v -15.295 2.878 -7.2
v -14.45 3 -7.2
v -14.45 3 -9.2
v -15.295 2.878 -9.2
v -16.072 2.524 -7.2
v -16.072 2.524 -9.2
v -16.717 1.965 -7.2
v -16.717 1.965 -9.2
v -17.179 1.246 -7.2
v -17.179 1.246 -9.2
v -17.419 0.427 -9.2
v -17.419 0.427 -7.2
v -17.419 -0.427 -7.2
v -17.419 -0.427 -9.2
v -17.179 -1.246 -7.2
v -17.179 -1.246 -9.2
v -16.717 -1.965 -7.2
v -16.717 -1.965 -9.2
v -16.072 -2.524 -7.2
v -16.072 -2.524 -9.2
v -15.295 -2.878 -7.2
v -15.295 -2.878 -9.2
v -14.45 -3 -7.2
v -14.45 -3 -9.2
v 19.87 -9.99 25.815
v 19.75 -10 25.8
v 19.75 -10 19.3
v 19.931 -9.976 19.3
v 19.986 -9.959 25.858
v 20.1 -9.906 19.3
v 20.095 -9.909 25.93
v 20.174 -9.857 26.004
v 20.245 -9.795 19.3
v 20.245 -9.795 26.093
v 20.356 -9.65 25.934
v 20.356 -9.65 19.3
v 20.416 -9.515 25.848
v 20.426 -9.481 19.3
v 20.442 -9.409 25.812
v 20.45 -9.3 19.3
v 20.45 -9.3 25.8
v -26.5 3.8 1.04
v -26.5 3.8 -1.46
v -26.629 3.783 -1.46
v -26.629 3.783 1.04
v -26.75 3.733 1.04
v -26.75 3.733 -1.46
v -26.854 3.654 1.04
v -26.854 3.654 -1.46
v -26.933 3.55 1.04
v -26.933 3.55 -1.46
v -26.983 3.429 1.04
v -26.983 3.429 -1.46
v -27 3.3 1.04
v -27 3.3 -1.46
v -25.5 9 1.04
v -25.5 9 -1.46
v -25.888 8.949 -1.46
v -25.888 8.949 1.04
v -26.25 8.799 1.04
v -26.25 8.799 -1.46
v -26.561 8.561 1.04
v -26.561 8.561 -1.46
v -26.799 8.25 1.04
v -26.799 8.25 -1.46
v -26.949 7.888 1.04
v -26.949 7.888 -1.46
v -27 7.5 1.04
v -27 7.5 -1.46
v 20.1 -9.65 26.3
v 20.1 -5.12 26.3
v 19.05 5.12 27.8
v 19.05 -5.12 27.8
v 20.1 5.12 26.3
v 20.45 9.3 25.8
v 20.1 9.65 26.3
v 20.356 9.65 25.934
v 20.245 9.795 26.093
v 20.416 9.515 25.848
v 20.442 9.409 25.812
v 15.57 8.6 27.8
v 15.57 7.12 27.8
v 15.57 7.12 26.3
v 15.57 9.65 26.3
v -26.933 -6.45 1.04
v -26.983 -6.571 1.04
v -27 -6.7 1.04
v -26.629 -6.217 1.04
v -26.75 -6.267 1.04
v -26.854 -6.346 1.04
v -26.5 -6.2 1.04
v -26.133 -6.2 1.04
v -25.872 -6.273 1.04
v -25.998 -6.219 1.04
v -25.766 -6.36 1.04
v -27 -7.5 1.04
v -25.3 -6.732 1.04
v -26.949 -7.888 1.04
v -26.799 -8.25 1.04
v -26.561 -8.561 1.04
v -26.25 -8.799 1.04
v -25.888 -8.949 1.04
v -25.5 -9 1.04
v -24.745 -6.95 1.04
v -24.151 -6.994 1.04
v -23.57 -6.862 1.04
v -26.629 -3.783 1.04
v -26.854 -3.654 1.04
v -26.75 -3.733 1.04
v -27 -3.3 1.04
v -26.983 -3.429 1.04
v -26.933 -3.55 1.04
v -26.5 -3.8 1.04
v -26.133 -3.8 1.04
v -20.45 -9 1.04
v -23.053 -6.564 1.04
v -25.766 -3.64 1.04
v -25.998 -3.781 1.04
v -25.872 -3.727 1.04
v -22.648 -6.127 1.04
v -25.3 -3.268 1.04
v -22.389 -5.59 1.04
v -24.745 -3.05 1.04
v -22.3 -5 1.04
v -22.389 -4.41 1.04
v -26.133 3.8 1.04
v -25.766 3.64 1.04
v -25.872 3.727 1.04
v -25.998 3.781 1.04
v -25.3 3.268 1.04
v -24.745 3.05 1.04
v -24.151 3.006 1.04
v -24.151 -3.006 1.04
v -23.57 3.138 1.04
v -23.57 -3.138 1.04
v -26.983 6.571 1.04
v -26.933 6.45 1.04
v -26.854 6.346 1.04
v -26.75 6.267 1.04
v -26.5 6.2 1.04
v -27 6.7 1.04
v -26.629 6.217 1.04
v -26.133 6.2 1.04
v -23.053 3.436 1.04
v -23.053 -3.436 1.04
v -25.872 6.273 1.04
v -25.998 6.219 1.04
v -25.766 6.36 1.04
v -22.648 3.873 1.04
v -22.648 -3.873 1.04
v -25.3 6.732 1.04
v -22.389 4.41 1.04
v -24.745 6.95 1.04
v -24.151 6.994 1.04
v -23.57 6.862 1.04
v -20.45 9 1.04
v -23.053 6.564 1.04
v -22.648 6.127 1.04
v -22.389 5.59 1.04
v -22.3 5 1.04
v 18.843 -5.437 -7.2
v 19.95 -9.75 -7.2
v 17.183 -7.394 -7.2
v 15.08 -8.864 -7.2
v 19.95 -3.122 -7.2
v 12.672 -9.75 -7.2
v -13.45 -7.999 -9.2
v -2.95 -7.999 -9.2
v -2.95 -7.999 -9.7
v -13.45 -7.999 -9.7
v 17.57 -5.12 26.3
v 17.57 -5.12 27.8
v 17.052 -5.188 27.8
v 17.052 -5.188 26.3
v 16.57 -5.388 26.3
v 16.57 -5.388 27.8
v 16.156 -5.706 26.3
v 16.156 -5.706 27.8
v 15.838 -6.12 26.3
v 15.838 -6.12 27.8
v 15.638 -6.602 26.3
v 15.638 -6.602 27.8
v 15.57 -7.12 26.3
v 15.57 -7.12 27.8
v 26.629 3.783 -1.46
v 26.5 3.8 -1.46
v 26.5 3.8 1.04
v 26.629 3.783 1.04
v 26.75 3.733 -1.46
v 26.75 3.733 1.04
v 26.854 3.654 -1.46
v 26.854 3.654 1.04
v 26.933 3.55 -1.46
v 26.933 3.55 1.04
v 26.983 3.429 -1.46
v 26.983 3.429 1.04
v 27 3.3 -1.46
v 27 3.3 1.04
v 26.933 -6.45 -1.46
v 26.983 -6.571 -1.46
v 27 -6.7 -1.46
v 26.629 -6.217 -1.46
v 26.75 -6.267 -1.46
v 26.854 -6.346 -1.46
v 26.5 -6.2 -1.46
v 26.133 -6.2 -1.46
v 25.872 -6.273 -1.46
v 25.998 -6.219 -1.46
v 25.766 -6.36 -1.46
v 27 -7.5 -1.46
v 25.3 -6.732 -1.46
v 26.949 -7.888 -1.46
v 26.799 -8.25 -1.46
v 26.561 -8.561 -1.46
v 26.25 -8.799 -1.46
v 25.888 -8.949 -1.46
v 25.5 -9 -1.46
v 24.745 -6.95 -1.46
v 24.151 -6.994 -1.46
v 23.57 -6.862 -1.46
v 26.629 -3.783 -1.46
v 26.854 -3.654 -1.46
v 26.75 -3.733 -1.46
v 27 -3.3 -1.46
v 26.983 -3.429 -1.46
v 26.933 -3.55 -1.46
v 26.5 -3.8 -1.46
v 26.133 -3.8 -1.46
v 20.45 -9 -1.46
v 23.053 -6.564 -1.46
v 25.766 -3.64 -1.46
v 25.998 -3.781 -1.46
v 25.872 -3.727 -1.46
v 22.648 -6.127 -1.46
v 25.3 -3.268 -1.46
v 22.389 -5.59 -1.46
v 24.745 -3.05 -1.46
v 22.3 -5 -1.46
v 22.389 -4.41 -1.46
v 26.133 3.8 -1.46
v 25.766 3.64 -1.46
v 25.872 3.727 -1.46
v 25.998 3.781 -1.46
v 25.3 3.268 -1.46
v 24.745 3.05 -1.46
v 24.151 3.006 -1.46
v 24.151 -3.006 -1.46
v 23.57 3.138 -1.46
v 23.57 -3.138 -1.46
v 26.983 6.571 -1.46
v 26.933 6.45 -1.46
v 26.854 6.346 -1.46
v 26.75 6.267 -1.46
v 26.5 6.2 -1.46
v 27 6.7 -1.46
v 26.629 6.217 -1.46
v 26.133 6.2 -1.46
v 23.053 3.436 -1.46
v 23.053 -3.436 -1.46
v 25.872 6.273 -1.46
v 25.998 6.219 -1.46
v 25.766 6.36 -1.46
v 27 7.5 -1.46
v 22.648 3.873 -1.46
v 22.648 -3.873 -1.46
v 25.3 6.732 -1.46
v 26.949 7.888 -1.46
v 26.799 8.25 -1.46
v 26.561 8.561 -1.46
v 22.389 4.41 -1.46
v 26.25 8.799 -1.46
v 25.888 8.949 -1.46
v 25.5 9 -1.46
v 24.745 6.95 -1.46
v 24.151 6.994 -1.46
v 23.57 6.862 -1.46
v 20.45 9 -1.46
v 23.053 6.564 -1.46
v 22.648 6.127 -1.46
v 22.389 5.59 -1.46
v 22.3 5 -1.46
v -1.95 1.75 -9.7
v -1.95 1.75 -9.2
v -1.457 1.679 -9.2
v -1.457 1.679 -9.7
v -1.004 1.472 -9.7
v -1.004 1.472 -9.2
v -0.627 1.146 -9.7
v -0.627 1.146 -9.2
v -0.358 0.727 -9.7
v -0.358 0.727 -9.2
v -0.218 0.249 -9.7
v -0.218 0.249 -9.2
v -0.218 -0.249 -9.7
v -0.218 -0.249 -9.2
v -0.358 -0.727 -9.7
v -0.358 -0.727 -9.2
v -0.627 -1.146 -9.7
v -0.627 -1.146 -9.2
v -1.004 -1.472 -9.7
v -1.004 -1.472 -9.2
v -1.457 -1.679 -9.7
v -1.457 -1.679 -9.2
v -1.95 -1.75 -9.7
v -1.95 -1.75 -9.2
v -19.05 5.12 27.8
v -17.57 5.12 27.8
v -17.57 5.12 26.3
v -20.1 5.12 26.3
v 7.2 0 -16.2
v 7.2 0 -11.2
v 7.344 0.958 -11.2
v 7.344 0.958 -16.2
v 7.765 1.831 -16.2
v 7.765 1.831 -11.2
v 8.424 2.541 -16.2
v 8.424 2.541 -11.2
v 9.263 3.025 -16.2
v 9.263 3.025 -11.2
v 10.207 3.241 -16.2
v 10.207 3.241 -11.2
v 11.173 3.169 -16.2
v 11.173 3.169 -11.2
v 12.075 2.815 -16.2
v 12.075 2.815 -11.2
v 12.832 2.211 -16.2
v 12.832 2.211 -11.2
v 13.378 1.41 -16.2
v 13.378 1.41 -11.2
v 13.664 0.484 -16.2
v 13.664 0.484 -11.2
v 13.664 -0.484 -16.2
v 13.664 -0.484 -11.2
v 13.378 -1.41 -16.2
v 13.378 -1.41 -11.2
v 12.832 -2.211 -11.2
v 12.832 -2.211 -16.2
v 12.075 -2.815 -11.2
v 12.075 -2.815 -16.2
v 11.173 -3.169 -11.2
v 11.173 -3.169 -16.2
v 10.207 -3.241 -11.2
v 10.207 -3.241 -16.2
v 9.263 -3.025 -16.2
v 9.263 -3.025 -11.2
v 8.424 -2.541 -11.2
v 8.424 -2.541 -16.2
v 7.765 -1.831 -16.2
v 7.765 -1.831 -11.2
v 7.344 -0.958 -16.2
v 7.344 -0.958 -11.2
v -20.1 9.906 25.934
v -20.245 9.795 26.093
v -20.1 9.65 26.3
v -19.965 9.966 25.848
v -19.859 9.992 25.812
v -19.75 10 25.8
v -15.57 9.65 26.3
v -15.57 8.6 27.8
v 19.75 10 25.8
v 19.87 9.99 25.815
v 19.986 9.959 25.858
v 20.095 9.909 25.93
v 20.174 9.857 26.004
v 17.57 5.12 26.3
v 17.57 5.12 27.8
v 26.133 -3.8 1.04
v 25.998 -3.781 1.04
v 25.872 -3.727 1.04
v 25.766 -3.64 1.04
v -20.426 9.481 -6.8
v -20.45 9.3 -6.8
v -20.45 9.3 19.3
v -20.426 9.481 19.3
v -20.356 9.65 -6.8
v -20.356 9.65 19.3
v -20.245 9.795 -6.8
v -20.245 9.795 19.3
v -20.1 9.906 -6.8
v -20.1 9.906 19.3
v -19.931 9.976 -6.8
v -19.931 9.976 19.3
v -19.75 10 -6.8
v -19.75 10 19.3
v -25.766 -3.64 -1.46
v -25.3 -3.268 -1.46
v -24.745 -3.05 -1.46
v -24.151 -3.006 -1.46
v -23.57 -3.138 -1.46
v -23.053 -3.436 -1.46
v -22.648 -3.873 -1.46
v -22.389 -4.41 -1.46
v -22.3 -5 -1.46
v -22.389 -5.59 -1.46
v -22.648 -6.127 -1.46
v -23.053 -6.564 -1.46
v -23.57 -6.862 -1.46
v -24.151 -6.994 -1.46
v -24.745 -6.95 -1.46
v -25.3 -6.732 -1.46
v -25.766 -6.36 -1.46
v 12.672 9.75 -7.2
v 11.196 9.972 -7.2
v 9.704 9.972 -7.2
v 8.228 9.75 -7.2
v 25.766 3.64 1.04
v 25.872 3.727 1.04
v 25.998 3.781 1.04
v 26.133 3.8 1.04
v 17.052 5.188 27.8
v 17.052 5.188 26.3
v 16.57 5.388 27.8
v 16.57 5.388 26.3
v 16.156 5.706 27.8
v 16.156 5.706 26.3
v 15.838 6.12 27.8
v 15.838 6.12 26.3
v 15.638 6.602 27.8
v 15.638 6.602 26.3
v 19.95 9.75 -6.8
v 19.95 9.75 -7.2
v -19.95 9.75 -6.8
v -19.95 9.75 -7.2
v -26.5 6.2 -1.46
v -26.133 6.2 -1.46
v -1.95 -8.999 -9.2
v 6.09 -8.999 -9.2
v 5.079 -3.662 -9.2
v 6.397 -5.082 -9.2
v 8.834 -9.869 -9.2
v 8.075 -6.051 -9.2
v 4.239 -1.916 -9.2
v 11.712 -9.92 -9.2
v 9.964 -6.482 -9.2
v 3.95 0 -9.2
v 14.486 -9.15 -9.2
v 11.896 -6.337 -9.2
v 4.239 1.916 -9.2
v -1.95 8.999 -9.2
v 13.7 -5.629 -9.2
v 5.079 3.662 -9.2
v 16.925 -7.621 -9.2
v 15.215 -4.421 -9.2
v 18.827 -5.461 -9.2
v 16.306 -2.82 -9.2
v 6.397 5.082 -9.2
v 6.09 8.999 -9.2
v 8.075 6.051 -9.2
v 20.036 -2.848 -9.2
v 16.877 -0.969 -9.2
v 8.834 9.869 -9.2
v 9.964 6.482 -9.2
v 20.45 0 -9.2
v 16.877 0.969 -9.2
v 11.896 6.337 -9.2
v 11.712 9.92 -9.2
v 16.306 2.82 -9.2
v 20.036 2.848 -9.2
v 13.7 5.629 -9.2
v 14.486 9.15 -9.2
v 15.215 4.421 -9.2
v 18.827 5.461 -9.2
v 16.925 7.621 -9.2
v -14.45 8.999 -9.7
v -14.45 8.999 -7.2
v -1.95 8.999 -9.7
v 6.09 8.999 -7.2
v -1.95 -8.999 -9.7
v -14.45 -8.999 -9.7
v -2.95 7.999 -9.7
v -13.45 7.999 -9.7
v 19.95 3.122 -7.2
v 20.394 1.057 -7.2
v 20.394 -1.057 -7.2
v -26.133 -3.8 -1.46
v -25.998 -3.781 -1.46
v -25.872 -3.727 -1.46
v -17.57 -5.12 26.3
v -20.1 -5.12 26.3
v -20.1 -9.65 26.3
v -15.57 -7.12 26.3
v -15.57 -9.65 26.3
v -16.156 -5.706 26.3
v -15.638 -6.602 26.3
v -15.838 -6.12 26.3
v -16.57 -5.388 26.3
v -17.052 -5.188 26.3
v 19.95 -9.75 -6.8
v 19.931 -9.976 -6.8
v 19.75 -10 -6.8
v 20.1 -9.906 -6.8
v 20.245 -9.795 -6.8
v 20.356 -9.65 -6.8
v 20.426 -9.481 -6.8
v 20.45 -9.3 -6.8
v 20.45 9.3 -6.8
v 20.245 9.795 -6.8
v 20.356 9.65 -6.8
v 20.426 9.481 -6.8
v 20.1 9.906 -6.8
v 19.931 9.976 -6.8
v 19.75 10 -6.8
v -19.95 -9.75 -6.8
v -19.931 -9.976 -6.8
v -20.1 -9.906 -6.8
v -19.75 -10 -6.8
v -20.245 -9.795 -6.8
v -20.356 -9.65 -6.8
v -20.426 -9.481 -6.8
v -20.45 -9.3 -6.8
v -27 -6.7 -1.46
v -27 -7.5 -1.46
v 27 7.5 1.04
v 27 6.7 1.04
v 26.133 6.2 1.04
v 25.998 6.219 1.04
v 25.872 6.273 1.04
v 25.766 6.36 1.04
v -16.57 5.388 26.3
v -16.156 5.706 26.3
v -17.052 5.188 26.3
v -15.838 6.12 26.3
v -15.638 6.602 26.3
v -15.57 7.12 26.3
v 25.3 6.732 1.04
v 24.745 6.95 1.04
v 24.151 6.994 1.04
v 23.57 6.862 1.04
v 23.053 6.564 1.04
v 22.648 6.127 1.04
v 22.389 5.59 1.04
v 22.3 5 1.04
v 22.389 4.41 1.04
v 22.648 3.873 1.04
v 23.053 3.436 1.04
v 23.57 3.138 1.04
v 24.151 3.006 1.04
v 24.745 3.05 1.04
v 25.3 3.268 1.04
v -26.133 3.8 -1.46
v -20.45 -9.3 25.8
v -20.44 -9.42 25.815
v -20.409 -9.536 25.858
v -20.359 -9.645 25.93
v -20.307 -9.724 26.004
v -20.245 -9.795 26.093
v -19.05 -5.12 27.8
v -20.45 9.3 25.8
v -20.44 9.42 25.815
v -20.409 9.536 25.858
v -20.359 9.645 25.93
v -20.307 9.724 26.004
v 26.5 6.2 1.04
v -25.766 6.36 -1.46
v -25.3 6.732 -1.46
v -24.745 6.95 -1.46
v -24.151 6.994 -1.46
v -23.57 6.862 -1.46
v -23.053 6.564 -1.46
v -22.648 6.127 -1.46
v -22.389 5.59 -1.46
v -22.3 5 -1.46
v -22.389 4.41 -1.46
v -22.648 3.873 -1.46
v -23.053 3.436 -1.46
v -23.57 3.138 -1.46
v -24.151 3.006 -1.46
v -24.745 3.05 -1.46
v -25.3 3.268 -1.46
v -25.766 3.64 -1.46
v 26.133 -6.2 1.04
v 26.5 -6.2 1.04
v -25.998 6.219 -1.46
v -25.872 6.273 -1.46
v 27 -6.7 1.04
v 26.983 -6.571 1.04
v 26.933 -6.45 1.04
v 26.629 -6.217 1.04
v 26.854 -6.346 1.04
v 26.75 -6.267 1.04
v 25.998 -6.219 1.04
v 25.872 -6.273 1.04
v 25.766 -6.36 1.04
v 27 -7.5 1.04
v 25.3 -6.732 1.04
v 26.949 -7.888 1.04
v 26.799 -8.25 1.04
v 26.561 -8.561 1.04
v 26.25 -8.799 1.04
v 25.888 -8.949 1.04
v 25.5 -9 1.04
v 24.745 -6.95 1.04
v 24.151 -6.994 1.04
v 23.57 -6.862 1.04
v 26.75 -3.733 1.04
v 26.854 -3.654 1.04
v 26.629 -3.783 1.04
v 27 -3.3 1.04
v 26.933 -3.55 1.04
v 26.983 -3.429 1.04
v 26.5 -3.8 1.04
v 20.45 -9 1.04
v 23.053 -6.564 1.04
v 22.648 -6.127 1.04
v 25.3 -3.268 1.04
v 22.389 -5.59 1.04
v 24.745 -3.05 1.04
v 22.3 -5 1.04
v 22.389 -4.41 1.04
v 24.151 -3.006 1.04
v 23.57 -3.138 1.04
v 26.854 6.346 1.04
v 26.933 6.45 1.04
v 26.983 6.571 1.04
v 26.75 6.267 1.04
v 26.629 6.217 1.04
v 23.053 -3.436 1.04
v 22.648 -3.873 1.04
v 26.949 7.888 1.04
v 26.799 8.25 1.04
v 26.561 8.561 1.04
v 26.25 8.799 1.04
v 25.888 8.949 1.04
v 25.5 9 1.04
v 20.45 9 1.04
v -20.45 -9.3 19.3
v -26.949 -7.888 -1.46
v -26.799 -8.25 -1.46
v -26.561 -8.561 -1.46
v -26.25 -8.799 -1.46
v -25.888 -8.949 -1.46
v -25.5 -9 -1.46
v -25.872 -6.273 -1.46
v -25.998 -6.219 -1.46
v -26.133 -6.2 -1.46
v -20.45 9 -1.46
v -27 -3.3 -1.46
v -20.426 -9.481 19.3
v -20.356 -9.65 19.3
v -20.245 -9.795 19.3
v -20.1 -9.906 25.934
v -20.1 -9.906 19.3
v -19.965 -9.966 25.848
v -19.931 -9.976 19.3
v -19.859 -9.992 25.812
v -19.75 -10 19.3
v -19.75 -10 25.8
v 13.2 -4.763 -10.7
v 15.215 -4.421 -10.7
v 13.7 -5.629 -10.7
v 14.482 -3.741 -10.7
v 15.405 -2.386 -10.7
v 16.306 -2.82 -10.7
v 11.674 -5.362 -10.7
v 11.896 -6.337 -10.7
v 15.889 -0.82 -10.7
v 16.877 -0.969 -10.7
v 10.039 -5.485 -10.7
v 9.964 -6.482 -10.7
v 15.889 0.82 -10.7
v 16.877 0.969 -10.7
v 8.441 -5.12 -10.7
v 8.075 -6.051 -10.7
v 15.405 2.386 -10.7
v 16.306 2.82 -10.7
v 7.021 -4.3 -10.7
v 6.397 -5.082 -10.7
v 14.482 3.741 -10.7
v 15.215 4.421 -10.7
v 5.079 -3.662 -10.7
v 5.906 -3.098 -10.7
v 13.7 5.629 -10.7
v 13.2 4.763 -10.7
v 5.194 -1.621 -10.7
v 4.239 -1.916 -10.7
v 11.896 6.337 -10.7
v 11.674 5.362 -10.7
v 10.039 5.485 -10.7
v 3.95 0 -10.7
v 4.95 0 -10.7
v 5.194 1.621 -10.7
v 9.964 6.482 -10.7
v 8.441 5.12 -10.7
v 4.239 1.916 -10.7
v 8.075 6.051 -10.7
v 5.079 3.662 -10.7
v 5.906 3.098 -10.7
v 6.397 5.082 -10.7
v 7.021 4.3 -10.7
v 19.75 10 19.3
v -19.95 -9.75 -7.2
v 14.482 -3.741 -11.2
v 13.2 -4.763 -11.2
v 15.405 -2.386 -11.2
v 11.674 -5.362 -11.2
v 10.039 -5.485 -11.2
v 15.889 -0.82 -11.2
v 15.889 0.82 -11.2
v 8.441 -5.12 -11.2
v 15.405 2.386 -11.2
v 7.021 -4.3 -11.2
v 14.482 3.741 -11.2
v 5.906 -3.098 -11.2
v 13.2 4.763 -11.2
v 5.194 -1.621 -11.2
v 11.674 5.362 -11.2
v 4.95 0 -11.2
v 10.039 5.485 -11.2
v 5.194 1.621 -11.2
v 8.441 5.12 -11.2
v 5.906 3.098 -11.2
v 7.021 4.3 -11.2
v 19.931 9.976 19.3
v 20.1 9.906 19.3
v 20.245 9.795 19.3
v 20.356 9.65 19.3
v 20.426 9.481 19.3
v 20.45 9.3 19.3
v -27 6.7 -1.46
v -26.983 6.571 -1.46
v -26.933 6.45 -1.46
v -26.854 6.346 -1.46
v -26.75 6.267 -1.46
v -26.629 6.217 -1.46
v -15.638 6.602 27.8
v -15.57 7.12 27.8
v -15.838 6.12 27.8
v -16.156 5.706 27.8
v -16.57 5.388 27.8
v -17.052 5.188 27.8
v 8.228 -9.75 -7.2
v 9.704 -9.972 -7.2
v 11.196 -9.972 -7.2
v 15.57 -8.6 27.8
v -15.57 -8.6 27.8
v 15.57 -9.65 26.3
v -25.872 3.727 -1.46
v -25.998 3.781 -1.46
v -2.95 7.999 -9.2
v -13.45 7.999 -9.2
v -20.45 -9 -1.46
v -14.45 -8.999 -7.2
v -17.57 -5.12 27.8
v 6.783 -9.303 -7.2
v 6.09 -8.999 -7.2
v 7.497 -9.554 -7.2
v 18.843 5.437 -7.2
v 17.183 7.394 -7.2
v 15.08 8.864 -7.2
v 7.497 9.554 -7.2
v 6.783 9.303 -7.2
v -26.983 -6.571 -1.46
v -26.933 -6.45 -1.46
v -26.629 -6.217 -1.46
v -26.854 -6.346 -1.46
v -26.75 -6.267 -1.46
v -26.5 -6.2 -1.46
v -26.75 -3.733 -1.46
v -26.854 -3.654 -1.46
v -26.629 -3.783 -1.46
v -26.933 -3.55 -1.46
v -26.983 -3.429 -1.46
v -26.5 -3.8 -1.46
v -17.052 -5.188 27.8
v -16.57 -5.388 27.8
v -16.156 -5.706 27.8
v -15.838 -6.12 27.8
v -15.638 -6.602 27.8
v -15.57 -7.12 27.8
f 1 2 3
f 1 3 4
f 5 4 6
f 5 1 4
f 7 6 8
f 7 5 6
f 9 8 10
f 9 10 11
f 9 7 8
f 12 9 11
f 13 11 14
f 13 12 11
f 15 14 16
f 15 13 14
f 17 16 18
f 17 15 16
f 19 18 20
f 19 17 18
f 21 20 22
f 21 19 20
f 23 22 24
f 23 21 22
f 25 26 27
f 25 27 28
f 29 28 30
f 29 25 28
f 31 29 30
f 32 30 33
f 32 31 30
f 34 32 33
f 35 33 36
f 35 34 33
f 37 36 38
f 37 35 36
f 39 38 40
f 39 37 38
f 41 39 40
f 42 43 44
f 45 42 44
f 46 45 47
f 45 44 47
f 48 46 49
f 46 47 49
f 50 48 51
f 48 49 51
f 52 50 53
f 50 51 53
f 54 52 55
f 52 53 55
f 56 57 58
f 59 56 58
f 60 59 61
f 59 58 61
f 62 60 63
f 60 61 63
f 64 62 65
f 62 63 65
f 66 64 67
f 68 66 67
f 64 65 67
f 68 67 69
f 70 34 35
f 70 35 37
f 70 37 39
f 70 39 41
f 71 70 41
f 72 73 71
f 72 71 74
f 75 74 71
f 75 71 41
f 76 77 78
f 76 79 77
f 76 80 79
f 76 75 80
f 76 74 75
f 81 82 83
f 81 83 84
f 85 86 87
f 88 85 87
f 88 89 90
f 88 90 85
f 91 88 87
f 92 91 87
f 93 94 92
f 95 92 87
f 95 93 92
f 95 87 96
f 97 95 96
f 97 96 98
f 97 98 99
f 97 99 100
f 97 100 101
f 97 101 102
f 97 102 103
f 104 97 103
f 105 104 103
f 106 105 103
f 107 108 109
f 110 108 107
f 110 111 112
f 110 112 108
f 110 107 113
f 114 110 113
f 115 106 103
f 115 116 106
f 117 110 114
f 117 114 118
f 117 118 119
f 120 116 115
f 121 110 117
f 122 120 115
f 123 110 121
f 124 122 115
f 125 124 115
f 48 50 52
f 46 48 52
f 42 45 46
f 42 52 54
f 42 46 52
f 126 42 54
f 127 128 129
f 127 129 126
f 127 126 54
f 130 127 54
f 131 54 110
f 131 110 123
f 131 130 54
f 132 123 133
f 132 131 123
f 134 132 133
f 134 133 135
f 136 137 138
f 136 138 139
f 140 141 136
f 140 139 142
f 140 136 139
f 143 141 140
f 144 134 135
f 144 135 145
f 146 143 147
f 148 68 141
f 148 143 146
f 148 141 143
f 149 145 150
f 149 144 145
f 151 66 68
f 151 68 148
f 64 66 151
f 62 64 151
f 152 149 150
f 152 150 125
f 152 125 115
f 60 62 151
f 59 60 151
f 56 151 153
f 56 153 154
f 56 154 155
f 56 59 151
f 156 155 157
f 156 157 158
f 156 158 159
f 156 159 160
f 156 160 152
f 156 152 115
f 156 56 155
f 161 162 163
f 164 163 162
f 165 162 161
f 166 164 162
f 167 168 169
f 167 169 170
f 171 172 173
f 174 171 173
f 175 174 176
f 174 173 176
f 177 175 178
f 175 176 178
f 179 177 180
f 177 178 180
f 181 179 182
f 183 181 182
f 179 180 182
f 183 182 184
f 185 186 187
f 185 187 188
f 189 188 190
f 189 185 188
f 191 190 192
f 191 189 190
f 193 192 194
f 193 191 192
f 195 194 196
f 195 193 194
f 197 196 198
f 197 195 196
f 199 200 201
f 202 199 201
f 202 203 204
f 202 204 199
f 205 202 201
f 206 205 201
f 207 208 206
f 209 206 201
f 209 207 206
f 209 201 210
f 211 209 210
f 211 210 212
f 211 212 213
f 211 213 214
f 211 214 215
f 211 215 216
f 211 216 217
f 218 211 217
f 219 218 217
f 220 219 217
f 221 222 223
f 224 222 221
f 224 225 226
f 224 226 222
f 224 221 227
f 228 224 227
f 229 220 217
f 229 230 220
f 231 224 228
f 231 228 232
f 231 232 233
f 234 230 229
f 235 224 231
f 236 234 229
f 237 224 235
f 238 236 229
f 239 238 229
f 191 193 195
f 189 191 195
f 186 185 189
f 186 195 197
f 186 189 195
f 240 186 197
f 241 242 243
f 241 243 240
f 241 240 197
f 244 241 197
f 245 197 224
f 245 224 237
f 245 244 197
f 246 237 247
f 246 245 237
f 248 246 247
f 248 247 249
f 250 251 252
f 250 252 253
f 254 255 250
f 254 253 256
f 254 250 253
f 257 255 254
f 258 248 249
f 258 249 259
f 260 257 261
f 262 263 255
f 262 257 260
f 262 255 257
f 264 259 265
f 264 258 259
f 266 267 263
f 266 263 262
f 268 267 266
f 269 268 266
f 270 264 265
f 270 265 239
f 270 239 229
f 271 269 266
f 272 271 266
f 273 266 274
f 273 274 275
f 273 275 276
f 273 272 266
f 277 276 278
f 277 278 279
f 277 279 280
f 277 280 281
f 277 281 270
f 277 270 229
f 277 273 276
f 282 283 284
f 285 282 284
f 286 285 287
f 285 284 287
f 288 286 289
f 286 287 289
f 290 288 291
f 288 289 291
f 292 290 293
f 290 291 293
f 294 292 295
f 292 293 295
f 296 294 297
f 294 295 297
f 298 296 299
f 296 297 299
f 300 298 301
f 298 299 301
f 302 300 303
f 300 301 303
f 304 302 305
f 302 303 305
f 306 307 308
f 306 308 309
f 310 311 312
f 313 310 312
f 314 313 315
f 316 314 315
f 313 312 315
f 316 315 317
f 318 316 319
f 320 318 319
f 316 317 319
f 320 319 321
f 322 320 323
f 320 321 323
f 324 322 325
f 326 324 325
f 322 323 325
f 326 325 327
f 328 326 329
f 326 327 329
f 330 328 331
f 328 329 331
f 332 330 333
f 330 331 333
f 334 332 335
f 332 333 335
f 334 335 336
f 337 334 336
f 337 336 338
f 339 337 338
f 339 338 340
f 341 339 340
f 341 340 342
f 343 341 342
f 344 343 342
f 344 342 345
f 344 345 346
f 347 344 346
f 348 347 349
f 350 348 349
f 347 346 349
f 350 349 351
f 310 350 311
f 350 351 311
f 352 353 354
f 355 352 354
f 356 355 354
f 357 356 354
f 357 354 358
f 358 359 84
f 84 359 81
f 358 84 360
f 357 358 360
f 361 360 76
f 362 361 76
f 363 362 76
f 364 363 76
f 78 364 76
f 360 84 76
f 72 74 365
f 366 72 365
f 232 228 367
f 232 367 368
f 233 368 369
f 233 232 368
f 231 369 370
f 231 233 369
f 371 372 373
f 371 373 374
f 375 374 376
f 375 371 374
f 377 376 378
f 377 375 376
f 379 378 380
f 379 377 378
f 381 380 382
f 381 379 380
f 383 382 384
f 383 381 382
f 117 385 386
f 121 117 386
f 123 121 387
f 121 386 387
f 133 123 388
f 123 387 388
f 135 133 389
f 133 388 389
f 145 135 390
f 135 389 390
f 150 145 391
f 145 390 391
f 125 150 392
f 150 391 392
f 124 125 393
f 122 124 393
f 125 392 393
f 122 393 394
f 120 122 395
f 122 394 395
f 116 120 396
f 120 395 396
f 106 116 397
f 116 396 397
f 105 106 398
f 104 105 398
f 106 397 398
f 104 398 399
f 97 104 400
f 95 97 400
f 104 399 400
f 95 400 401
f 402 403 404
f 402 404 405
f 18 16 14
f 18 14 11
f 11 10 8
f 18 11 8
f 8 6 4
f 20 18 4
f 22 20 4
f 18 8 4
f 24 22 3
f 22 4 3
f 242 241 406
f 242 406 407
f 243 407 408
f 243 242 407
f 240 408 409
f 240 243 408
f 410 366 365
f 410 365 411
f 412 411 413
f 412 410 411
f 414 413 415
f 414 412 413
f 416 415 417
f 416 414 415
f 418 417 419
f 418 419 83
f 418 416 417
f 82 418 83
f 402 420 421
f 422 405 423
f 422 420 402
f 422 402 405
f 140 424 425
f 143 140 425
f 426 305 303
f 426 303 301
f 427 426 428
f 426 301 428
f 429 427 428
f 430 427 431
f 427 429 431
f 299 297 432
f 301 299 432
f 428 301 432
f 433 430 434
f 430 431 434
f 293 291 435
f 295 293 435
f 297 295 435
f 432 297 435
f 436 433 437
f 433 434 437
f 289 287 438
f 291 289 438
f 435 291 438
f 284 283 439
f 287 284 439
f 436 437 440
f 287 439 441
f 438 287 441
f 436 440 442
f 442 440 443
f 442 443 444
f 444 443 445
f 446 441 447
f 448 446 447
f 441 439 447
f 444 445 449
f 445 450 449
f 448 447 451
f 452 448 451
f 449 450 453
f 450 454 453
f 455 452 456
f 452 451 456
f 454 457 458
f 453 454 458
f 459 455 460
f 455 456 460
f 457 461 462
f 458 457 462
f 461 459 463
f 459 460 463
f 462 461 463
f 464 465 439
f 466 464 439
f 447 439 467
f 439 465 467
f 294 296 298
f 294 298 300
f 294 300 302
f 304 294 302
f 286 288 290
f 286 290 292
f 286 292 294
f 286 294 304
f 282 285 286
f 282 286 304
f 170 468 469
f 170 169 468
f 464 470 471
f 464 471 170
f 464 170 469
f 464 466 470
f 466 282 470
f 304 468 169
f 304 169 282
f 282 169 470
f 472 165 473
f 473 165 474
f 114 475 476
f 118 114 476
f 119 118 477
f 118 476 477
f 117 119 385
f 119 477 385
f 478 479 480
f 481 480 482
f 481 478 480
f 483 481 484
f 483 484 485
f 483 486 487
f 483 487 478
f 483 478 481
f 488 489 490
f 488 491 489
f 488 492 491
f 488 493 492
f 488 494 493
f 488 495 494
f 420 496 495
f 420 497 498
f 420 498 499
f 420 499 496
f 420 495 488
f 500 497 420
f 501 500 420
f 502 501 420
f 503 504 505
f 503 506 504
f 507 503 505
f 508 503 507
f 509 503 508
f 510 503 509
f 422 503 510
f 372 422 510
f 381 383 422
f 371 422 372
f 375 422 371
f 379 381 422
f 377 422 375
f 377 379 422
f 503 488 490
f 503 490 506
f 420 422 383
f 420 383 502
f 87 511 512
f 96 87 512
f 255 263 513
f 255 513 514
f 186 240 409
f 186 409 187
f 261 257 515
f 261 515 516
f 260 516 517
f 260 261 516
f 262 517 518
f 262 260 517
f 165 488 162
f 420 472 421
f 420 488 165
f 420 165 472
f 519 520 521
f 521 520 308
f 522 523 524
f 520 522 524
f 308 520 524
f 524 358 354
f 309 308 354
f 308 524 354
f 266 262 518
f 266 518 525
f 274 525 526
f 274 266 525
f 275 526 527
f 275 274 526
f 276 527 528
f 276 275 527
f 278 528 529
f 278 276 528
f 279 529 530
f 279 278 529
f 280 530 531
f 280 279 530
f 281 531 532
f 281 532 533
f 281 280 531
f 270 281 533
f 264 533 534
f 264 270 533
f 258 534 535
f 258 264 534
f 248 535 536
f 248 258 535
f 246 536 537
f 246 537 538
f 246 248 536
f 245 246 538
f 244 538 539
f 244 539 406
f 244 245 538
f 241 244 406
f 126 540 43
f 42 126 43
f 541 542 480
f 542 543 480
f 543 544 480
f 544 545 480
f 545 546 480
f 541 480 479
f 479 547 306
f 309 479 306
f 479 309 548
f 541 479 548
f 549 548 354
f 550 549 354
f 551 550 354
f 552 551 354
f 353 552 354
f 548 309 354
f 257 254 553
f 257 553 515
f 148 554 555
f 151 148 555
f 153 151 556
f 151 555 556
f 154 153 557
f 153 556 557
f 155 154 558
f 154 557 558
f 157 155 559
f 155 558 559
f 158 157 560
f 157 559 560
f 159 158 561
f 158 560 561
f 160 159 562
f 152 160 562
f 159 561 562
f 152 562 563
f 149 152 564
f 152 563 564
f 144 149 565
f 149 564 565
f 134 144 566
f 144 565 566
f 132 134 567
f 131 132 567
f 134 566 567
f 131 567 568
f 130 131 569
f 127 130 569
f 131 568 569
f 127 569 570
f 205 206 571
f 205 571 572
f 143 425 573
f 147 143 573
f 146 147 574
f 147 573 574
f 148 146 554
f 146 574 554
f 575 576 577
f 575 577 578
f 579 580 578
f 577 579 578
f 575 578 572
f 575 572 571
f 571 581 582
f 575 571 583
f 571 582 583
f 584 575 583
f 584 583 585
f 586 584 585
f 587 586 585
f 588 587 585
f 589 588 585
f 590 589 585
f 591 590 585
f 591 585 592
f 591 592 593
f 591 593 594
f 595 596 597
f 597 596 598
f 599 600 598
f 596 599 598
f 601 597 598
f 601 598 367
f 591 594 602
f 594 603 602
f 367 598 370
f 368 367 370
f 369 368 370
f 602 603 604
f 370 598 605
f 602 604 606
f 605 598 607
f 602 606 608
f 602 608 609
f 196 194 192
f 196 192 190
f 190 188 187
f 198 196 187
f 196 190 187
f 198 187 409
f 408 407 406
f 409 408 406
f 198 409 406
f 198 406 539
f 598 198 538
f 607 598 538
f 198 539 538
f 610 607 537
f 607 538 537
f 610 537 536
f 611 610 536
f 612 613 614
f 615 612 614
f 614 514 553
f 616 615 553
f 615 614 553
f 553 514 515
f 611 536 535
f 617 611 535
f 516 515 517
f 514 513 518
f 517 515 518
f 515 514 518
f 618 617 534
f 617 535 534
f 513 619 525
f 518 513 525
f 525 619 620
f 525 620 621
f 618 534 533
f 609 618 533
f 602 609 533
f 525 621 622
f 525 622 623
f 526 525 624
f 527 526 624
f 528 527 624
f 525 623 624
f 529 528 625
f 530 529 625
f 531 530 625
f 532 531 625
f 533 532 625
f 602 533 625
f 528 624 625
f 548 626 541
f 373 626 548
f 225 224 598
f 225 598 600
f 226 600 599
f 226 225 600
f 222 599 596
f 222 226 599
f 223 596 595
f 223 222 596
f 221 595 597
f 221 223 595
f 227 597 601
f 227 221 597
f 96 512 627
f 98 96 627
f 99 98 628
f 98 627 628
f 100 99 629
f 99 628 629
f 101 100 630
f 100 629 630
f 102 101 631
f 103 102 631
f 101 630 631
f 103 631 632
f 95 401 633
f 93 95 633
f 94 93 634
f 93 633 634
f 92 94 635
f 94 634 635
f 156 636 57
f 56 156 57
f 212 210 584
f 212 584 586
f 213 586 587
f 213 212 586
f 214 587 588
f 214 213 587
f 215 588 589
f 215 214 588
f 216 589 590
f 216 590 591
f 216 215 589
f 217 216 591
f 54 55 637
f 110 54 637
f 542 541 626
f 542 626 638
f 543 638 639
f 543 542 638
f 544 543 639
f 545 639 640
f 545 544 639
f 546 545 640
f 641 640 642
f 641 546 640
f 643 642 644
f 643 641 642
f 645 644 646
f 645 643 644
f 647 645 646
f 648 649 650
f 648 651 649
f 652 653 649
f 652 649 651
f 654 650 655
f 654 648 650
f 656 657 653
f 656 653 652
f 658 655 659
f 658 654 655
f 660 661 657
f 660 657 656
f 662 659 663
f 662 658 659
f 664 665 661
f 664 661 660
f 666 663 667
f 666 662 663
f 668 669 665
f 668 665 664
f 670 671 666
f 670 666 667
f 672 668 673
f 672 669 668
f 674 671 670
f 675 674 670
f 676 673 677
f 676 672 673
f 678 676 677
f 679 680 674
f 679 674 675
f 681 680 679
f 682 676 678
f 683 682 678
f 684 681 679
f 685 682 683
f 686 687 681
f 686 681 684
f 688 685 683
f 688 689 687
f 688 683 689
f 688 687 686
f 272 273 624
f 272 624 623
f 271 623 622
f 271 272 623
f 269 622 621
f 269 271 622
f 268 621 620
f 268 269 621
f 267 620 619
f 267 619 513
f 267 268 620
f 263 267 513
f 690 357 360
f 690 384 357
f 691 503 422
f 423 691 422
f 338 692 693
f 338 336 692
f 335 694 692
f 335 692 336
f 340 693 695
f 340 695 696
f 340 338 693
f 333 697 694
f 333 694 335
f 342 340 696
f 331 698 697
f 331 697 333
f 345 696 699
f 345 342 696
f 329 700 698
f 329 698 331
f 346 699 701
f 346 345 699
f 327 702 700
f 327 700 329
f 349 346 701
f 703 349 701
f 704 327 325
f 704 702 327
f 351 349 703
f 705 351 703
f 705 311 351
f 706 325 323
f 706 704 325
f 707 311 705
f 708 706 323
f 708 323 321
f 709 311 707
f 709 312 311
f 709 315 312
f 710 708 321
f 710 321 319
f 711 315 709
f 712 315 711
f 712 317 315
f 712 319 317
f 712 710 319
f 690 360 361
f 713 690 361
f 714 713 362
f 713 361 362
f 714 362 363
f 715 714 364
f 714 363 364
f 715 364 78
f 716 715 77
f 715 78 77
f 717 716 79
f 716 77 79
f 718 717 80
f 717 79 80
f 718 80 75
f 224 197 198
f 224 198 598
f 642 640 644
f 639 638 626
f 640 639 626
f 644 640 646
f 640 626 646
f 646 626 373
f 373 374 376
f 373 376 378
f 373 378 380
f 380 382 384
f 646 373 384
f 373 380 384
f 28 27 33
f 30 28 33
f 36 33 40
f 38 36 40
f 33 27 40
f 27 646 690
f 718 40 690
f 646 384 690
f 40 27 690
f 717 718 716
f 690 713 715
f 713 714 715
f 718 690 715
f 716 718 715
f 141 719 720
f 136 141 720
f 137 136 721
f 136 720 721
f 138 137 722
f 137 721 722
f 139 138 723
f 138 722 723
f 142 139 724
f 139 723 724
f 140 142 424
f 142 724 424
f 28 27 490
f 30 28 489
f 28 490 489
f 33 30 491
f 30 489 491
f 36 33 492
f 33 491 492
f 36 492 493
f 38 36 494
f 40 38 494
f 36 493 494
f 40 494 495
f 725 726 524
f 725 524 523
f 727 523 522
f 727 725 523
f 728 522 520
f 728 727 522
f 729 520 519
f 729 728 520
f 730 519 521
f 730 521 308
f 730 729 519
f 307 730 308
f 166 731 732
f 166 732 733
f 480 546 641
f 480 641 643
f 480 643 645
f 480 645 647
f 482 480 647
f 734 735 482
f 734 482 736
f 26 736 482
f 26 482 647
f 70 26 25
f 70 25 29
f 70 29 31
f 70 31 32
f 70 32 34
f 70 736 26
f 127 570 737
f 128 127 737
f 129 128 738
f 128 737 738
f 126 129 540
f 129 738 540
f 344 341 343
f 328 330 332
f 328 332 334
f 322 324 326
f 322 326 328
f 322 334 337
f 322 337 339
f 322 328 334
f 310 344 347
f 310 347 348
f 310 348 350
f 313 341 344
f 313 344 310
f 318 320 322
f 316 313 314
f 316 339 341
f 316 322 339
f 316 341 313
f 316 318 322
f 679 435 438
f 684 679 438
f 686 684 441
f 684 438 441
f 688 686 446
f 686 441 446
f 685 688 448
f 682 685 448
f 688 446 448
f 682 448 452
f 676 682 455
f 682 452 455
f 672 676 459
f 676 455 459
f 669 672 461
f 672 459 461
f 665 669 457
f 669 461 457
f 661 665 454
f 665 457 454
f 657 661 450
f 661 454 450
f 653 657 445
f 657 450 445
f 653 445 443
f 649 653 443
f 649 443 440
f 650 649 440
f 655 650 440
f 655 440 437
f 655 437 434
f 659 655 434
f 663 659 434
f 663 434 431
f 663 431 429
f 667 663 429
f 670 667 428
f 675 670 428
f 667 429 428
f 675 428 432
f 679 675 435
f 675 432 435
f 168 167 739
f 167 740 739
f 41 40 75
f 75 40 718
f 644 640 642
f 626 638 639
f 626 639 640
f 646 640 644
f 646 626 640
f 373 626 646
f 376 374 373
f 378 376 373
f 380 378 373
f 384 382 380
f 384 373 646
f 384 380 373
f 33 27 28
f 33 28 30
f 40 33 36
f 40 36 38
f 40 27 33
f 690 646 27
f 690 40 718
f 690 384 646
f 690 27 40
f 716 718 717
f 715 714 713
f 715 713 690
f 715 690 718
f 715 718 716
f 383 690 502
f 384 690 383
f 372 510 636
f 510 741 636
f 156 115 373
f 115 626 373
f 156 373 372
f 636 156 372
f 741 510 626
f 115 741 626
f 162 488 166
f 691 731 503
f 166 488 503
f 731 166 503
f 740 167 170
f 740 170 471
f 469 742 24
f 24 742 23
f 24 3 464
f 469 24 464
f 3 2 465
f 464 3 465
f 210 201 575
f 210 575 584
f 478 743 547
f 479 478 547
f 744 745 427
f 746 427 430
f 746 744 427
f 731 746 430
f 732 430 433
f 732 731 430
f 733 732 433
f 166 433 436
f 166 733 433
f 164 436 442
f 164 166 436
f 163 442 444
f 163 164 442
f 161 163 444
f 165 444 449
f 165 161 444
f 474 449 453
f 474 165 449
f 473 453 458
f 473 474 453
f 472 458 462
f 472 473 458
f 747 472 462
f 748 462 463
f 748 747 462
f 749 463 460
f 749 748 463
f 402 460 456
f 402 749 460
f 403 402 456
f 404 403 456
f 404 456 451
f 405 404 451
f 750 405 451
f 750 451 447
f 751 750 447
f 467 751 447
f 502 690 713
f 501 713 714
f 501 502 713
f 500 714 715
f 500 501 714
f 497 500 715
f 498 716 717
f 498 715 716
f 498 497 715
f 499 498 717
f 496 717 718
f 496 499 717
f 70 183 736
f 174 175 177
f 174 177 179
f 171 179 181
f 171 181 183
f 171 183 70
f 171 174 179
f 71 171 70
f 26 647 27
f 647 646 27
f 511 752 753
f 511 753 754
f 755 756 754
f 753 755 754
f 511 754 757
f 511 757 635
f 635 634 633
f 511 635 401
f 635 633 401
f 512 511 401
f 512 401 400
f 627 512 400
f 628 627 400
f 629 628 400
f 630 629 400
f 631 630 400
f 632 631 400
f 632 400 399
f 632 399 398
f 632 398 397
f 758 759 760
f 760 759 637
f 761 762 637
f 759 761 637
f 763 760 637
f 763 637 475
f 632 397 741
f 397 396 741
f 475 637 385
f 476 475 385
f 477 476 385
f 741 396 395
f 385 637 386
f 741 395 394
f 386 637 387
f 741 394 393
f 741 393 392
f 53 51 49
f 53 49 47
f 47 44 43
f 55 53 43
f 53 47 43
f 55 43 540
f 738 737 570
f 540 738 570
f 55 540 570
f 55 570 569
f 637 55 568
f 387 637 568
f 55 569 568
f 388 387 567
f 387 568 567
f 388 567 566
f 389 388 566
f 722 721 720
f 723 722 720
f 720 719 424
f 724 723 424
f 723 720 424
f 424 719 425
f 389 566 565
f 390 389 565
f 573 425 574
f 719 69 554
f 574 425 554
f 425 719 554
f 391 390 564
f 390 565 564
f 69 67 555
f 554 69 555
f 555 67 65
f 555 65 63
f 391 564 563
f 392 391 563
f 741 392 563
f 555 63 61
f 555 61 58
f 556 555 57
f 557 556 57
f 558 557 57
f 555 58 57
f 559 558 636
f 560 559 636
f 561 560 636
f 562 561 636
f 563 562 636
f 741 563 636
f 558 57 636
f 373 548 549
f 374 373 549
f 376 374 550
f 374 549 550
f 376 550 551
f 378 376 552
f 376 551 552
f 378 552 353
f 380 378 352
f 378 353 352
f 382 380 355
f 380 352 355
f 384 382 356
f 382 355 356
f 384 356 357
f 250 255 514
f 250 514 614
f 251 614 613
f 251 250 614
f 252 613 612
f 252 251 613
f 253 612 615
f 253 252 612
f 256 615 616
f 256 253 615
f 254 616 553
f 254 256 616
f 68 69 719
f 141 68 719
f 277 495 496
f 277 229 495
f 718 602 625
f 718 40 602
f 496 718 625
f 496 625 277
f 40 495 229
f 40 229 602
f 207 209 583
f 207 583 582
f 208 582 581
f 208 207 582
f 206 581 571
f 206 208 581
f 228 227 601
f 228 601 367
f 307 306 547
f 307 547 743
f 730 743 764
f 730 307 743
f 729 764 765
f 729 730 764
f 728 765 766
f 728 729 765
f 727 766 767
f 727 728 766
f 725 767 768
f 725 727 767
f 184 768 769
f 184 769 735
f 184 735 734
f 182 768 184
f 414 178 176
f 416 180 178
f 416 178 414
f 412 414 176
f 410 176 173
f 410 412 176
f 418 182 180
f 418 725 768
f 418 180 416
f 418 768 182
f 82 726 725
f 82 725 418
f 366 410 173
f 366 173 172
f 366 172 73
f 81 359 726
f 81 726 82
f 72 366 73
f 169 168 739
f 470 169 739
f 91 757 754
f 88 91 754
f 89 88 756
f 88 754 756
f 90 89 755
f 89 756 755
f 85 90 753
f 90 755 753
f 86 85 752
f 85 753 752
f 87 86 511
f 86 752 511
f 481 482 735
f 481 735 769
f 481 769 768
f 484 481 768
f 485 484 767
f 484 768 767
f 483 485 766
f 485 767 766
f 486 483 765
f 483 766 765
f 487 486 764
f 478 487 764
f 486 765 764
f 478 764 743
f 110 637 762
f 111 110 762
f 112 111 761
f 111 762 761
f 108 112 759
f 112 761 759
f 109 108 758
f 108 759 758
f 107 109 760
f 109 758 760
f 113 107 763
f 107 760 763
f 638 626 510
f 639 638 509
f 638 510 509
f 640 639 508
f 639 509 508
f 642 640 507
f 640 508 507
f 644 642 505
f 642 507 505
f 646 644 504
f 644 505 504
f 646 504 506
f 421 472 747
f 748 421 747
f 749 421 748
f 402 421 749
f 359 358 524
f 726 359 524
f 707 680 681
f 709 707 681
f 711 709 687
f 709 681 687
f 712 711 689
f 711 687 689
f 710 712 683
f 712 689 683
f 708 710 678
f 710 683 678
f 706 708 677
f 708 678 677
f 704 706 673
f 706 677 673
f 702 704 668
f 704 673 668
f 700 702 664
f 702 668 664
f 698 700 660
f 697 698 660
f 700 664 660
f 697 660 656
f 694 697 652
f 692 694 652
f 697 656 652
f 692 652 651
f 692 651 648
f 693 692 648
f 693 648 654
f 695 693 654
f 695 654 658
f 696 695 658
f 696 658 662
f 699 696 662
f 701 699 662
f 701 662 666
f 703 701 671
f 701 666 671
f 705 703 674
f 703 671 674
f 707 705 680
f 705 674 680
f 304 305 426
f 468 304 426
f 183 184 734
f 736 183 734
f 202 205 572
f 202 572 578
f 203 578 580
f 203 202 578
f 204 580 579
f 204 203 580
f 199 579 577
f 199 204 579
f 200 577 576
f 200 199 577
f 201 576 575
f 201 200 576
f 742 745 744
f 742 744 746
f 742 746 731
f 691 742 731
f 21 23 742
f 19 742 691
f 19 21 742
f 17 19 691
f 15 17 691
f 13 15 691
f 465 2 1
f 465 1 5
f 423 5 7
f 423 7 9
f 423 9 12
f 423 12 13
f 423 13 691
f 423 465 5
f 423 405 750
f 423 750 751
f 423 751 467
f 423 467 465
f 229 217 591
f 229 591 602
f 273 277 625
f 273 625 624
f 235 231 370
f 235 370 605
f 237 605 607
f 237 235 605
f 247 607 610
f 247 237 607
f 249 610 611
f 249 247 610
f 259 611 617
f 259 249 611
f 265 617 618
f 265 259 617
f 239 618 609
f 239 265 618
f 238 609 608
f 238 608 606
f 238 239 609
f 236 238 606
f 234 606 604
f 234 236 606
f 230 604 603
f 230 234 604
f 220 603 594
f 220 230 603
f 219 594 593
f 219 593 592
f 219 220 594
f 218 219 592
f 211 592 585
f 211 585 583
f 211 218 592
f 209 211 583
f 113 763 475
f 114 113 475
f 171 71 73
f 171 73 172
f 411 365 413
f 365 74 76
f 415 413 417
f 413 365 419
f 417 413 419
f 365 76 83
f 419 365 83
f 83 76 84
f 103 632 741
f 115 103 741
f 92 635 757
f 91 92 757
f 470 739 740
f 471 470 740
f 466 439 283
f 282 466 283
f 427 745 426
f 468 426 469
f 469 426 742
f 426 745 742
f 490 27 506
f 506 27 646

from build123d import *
from OCP.BRepFilletAPI import BRepFilletAPI_MakeChamfer

# Parameters (mm, degrees)
SKETCH1_W            = 40.9
SKETCH1_H            = 20
BOSS_EXTRUDE3_DEPTH  = 19.3
SKETCH4_W            = 40.9
SKETCH4_H            = 20
BOSS_EXTRUDE4_DEPTH  = 6.8
SKETCH6_W            = 40.9
SKETCH6_H            = 20
BOSS_EXTRUDE6_DEPTH  = 8.5
CHAMFER1_SIZE        = 2
CHAMFER1_SIZE2       = 1.400415076
CUT_EXTRUDE1_DEPTH   = 1.5
SKETCH8_W            = 39.9
SKETCH8_H            = 19.5
BOSS_EXTRUDE7_DEPTH  = 0.4
BOSS_EXTRUDE8_DEPTH  = 2
SKETCH10_R           = 6.5
BOSS_EXTRUDE9_DEPTH  = 1.5
SKETCH11_R           = 5.5
BOSS_EXTRUDE10_DEPTH = 0.5
SKETCH12_R           = 3.25
BOSS_EXTRUDE11_DEPTH = 5
SKETCH13_W           = 10.5
SKETCH13_H           = 15.998933302
BOSS_EXTRUDE12_DEPTH = 0.5
FILLET1_R            = 0.7
FILLET6_R            = 0.7
FILLET7_R            = 0.7
BOSS_EXTRUDE13_START = -5.74
BOSS_EXTRUDE13_DEPTH = 2.5


with BuildPart() as part:
    # Sketch1 → Boss-Extrude3 (new body)
    with BuildSketch(Plane.XY):
        Rectangle(SKETCH1_W, SKETCH1_H)
    extrude(amount=BOSS_EXTRUDE3_DEPTH)

    # Fillet1
    fillet1_edges = [part.edges().sort_by_distance(p)[0] for p in [
        (20.45, -10, 9.65),
        (-20.45, -10, 9.65),
        (-20.45, 10, 9.65),
        (20.45, 10, 9.65),
    ]]
    fillet(fillet1_edges, radius=FILLET1_R)



with BuildPart() as body_2:
    # Sketch4 → Boss-Extrude4 (new body)
    with BuildSketch(Plane(origin=(0, 0, 0), x_dir=(-1, 0, 0), z_dir=(0, 0, -1))):
        Rectangle(SKETCH4_W, SKETCH4_H)
    extrude(amount=BOSS_EXTRUDE4_DEPTH)

    # Sketch8 → Boss-Extrude7 (add)
    with BuildSketch(Plane(origin=(0, 0, -6.8), x_dir=(-1, 0, 0), z_dir=(0, 0, -1))):
        Rectangle(SKETCH8_W, SKETCH8_H)
    extrude(amount=BOSS_EXTRUDE7_DEPTH)

    # Sketch9 → Boss-Extrude8 (add)
    with BuildSketch(Plane(origin=(0, 0, -7.2), x_dir=(-1, 0, 0), z_dir=(0, 0, -1))):
        with BuildLine():
            Line((-6.09, 8.999466651), (14.45, 8.999466651))
            Line((14.45, 8.999466651), (14.45, 3))
            ThreePointArc((14.45, 3), (17.45, 0), (14.45, -3))
            Line((14.45, -3), (14.45, -8.999466651))
            Line((14.45, -8.999466651), (-6.09, -8.999466651))
            ThreePointArc((-6.09, -8.999466651), (-20.45, 0), (-6.09, 8.999466651))
        make_face()
    extrude(amount=BOSS_EXTRUDE8_DEPTH)

    # Sketch10 → Boss-Extrude9 (add)
    with BuildSketch(Plane(origin=(0, 0, -9.2), x_dir=(-1, 0, 0), z_dir=(0, 0, -1))):
        with Locations((-10.45, 0)):
            Circle(SKETCH10_R)
    extrude(amount=BOSS_EXTRUDE9_DEPTH)

    # Sketch11 → Boss-Extrude10 (add)
    with BuildSketch(Plane(origin=(0, 0, -10.7), x_dir=(-1, 0, 0), z_dir=(0, 0, -1))):
        with Locations((-10.45, 0)):
            Circle(SKETCH11_R)
    extrude(amount=BOSS_EXTRUDE10_DEPTH)

    # Sketch12 → Boss-Extrude11 (add)
    with BuildSketch(Plane(origin=(0, 0, -11.2), x_dir=(-1, 0, 0), z_dir=(0, 0, -1))):
        with Locations((-10.45, 0)):
            Circle(SKETCH12_R)
    extrude(amount=BOSS_EXTRUDE11_DEPTH)

    # Sketch13 → Boss-Extrude12 (add)
    with BuildSketch(Plane(origin=(0, 0, -9.2), x_dir=(-1, 0, 0), z_dir=(0, 0, -1))):
        with BuildLine():
            Line((14.45, 8.999466651), (1.95, 8.999466651))
            Line((1.95, 8.999466651), (1.95, 1.75))
            ThreePointArc((1.95, 1.75), (0.2, 0), (1.95, -1.75))
            Line((1.95, -1.75), (1.95, -8.999466651))
            Line((1.95, -8.999466651), (14.45, -8.999466651))
            Line((14.45, -8.999466651), (14.45, 8.999466651))
        make_face()
        with Locations((8.2, 0)):
            Rectangle(SKETCH13_W, SKETCH13_H, mode=Mode.SUBTRACT)
    extrude(amount=BOSS_EXTRUDE12_DEPTH)

    # Fillet6
    fillet6_edges = [body_2.edges().sort_by_distance(p)[0] for p in [
        (-20.45, 10, -3.4),
        (-20.45, -10, -3.4),
        (20.45, -10, -3.4),
        (20.45, 10, -3.4),
    ]]
    fillet(fillet6_edges, radius=FILLET6_R)


with BuildPart() as body_3:
    # Sketch6 → Boss-Extrude6 (new body)
    with BuildSketch(Plane.XY.offset(19.3)):
        Rectangle(SKETCH6_W, SKETCH6_H)
    extrude(amount=BOSS_EXTRUDE6_DEPTH)

    # Chamfer1: one chamfer whose edges measure the first distance from different faces: ONE call of the kernel's chamfer builder (chamfer() names one face for all edges)
    chamfer1_edges_1 = [body_3.edges().sort_by_distance(p)[0] for p in [
        (0, 10, 27.8),
    ]]
    chamfer1_side_1 = [body_3.faces().sort_by_distance(p)[0] for p in [
        (0, 10, 23.55),
    ]]
    chamfer1_edges_2 = [body_3.edges().sort_by_distance(p)[0] for p in [
        (-20.45, 0, 27.8),
    ]]
    chamfer1_side_2 = [body_3.faces().sort_by_distance(p)[0] for p in [
        (-20.45, 0, 23.55),
    ]]
    chamfer1_edges_3 = [body_3.edges().sort_by_distance(p)[0] for p in [
        (0, -10, 27.8),
    ]]
    chamfer1_side_3 = [body_3.faces().sort_by_distance(p)[0] for p in [
        (0, -10, 23.55),
    ]]
    chamfer1_edges_4 = [body_3.edges().sort_by_distance(p)[0] for p in [
        (20.45, 0, 27.8),
    ]]
    chamfer1_side_4 = [body_3.faces().sort_by_distance(p)[0] for p in [
        (20.45, 0, 23.55),
    ]]
    chamfer1 = BRepFilletAPI_MakeChamfer(body_3.part.solid().wrapped)
    for e in chamfer1_edges_1:
        chamfer1.Add(CHAMFER1_SIZE, CHAMFER1_SIZE2, e.wrapped, chamfer1_side_1[0].wrapped)  # the first distance lies on this face
    for e in chamfer1_edges_2:
        chamfer1.Add(CHAMFER1_SIZE, CHAMFER1_SIZE2, e.wrapped, chamfer1_side_2[0].wrapped)  # the first distance lies on this face
    for e in chamfer1_edges_3:
        chamfer1.Add(CHAMFER1_SIZE, CHAMFER1_SIZE2, e.wrapped, chamfer1_side_3[0].wrapped)  # the first distance lies on this face
    for e in chamfer1_edges_4:
        chamfer1.Add(CHAMFER1_SIZE, CHAMFER1_SIZE2, e.wrapped, chamfer1_side_4[0].wrapped)  # the first distance lies on this face
    add(Compound.cast(chamfer1.Shape()), mode=Mode.REPLACE)

    # Sketch7 → Cut-Extrude1 (cut)
    with BuildSketch(Plane.XY.offset(27.8)):
        with BuildLine():
            Line((-20.45, 10), (-15.57, 10))
            Line((-15.57, 10), (-15.57, 7.12))
            ThreePointArc((-15.57, 7.12), (-16.155786438, 5.705786438), (-17.57, 5.12))
            Line((-17.57, 5.12), (-20.45, 5.12))
            Line((-20.45, 5.12), (-20.45, 10))
        make_face()
        with BuildLine():
            Line((20.45, 5.12), (17.57, 5.12))
            ThreePointArc((17.57, 5.12), (16.155786438, 5.705786438), (15.57, 7.12))
            Line((15.57, 7.12), (15.57, 10))
            Line((15.57, 10), (20.45, 10))
            Line((20.45, 10), (20.45, 5.12))
        make_face()
        with BuildLine():
            Line((20.45, -10), (20.45, -5.12))
            Line((20.45, -5.12), (17.57, -5.12))
            ThreePointArc((17.57, -5.12), (16.155786438, -5.705786438), (15.57, -7.12))
            Line((15.57, -7.12), (15.57, -10))
            Line((15.57, -10), (20.45, -10))
        make_face()
        with BuildLine():
            Line((-15.57, -10), (-15.57, -7.12))
            ThreePointArc((-15.57, -7.12), (-16.155786438, -5.705786438), (-17.57, -5.12))
            Line((-17.57, -5.12), (-20.45, -5.12))
            Line((-20.45, -5.12), (-20.45, -10))
            Line((-20.45, -10), (-15.57, -10))
        make_face()
    extrude(amount=-CUT_EXTRUDE1_DEPTH, mode=Mode.SUBTRACT)

    # Fillet7
    fillet7_edges = [body_3.edges().sort_by_distance(p)[0] for p in [
        (-20.45, -10, 22.55),
        (-20.45, 10, 22.55),
        (20.45, 10, 22.55),
        (20.45, -10, 22.55),
    ]]
    fillet(fillet7_edges, radius=FILLET7_R)


with BuildPart() as part_1:
    add(part.part)

    add(body_2.part)  # Boss-Extrude13 merges body 2
    # Sketch16 → Boss-Extrude13 (add)
    with BuildSketch(Plane(origin=(0, 0, -7.2), x_dir=(-1, 0, 0), z_dir=(0, 0, -1)).offset(BOSS_EXTRUDE13_START)):
        with BuildLine():
            Line((20.45, 9), (25.5, 9))
            ThreePointArc((25.5, 9), (26.560660172, 8.560660172), (27, 7.5))
            Line((27, 7.5), (27, 6.7))
            ThreePointArc((27, 6.7), (26.853553391, 6.346446609), (26.5, 6.2))
            Line((26.5, 6.2), (26.133030278, 6.2))
            ThreePointArc((26.133030278, 6.2), (25.933030278, 6.241742431), (25.766424222, 6.36))
            ThreePointArc((25.766424222, 6.36), (22.3, 5), (25.766424222, 3.64))
            ThreePointArc((25.766424222, 3.64), (25.933030278, 3.758257569), (26.133030278, 3.8))
            Line((26.133030278, 3.8), (26.5, 3.8))
            ThreePointArc((26.5, 3.8), (26.853553391, 3.653553391), (27, 3.3))
            Line((27, 3.3), (27, -3.3))
            ThreePointArc((27, -3.3), (26.853553391, -3.653553391), (26.5, -3.8))
            Line((26.5, -3.8), (26.133030278, -3.8))
            ThreePointArc((26.133030278, -3.8), (25.933030278, -3.758257569), (25.766424222, -3.64))
            ThreePointArc((25.766424222, -3.64), (22.3, -5), (25.766424222, -6.36))
            ThreePointArc((25.766424222, -6.36), (25.933030278, -6.241742431), (26.133030278, -6.2))
            Line((26.133030278, -6.2), (26.5, -6.2))
            ThreePointArc((26.5, -6.2), (26.853553391, -6.346446609), (27, -6.7))
            Line((27, -6.7), (27, -7.5))
            ThreePointArc((27, -7.5), (26.560660172, -8.560660172), (25.5, -9))
            Line((25.5, -9), (20.45, -9))
            Line((20.45, -9), (20.45, 9))
        make_face()
    boss_extrude13 = extrude(amount=-BOSS_EXTRUDE13_DEPTH)

    # Mirror1: Boss-Extrude13 across plane
    add(boss_extrude13.mirror(Plane(origin=(0, 0, 0), x_dir=(0, 0, 1), z_dir=(1, 0, 0))))


solid = Compound([body_3.part, part_1.part])
